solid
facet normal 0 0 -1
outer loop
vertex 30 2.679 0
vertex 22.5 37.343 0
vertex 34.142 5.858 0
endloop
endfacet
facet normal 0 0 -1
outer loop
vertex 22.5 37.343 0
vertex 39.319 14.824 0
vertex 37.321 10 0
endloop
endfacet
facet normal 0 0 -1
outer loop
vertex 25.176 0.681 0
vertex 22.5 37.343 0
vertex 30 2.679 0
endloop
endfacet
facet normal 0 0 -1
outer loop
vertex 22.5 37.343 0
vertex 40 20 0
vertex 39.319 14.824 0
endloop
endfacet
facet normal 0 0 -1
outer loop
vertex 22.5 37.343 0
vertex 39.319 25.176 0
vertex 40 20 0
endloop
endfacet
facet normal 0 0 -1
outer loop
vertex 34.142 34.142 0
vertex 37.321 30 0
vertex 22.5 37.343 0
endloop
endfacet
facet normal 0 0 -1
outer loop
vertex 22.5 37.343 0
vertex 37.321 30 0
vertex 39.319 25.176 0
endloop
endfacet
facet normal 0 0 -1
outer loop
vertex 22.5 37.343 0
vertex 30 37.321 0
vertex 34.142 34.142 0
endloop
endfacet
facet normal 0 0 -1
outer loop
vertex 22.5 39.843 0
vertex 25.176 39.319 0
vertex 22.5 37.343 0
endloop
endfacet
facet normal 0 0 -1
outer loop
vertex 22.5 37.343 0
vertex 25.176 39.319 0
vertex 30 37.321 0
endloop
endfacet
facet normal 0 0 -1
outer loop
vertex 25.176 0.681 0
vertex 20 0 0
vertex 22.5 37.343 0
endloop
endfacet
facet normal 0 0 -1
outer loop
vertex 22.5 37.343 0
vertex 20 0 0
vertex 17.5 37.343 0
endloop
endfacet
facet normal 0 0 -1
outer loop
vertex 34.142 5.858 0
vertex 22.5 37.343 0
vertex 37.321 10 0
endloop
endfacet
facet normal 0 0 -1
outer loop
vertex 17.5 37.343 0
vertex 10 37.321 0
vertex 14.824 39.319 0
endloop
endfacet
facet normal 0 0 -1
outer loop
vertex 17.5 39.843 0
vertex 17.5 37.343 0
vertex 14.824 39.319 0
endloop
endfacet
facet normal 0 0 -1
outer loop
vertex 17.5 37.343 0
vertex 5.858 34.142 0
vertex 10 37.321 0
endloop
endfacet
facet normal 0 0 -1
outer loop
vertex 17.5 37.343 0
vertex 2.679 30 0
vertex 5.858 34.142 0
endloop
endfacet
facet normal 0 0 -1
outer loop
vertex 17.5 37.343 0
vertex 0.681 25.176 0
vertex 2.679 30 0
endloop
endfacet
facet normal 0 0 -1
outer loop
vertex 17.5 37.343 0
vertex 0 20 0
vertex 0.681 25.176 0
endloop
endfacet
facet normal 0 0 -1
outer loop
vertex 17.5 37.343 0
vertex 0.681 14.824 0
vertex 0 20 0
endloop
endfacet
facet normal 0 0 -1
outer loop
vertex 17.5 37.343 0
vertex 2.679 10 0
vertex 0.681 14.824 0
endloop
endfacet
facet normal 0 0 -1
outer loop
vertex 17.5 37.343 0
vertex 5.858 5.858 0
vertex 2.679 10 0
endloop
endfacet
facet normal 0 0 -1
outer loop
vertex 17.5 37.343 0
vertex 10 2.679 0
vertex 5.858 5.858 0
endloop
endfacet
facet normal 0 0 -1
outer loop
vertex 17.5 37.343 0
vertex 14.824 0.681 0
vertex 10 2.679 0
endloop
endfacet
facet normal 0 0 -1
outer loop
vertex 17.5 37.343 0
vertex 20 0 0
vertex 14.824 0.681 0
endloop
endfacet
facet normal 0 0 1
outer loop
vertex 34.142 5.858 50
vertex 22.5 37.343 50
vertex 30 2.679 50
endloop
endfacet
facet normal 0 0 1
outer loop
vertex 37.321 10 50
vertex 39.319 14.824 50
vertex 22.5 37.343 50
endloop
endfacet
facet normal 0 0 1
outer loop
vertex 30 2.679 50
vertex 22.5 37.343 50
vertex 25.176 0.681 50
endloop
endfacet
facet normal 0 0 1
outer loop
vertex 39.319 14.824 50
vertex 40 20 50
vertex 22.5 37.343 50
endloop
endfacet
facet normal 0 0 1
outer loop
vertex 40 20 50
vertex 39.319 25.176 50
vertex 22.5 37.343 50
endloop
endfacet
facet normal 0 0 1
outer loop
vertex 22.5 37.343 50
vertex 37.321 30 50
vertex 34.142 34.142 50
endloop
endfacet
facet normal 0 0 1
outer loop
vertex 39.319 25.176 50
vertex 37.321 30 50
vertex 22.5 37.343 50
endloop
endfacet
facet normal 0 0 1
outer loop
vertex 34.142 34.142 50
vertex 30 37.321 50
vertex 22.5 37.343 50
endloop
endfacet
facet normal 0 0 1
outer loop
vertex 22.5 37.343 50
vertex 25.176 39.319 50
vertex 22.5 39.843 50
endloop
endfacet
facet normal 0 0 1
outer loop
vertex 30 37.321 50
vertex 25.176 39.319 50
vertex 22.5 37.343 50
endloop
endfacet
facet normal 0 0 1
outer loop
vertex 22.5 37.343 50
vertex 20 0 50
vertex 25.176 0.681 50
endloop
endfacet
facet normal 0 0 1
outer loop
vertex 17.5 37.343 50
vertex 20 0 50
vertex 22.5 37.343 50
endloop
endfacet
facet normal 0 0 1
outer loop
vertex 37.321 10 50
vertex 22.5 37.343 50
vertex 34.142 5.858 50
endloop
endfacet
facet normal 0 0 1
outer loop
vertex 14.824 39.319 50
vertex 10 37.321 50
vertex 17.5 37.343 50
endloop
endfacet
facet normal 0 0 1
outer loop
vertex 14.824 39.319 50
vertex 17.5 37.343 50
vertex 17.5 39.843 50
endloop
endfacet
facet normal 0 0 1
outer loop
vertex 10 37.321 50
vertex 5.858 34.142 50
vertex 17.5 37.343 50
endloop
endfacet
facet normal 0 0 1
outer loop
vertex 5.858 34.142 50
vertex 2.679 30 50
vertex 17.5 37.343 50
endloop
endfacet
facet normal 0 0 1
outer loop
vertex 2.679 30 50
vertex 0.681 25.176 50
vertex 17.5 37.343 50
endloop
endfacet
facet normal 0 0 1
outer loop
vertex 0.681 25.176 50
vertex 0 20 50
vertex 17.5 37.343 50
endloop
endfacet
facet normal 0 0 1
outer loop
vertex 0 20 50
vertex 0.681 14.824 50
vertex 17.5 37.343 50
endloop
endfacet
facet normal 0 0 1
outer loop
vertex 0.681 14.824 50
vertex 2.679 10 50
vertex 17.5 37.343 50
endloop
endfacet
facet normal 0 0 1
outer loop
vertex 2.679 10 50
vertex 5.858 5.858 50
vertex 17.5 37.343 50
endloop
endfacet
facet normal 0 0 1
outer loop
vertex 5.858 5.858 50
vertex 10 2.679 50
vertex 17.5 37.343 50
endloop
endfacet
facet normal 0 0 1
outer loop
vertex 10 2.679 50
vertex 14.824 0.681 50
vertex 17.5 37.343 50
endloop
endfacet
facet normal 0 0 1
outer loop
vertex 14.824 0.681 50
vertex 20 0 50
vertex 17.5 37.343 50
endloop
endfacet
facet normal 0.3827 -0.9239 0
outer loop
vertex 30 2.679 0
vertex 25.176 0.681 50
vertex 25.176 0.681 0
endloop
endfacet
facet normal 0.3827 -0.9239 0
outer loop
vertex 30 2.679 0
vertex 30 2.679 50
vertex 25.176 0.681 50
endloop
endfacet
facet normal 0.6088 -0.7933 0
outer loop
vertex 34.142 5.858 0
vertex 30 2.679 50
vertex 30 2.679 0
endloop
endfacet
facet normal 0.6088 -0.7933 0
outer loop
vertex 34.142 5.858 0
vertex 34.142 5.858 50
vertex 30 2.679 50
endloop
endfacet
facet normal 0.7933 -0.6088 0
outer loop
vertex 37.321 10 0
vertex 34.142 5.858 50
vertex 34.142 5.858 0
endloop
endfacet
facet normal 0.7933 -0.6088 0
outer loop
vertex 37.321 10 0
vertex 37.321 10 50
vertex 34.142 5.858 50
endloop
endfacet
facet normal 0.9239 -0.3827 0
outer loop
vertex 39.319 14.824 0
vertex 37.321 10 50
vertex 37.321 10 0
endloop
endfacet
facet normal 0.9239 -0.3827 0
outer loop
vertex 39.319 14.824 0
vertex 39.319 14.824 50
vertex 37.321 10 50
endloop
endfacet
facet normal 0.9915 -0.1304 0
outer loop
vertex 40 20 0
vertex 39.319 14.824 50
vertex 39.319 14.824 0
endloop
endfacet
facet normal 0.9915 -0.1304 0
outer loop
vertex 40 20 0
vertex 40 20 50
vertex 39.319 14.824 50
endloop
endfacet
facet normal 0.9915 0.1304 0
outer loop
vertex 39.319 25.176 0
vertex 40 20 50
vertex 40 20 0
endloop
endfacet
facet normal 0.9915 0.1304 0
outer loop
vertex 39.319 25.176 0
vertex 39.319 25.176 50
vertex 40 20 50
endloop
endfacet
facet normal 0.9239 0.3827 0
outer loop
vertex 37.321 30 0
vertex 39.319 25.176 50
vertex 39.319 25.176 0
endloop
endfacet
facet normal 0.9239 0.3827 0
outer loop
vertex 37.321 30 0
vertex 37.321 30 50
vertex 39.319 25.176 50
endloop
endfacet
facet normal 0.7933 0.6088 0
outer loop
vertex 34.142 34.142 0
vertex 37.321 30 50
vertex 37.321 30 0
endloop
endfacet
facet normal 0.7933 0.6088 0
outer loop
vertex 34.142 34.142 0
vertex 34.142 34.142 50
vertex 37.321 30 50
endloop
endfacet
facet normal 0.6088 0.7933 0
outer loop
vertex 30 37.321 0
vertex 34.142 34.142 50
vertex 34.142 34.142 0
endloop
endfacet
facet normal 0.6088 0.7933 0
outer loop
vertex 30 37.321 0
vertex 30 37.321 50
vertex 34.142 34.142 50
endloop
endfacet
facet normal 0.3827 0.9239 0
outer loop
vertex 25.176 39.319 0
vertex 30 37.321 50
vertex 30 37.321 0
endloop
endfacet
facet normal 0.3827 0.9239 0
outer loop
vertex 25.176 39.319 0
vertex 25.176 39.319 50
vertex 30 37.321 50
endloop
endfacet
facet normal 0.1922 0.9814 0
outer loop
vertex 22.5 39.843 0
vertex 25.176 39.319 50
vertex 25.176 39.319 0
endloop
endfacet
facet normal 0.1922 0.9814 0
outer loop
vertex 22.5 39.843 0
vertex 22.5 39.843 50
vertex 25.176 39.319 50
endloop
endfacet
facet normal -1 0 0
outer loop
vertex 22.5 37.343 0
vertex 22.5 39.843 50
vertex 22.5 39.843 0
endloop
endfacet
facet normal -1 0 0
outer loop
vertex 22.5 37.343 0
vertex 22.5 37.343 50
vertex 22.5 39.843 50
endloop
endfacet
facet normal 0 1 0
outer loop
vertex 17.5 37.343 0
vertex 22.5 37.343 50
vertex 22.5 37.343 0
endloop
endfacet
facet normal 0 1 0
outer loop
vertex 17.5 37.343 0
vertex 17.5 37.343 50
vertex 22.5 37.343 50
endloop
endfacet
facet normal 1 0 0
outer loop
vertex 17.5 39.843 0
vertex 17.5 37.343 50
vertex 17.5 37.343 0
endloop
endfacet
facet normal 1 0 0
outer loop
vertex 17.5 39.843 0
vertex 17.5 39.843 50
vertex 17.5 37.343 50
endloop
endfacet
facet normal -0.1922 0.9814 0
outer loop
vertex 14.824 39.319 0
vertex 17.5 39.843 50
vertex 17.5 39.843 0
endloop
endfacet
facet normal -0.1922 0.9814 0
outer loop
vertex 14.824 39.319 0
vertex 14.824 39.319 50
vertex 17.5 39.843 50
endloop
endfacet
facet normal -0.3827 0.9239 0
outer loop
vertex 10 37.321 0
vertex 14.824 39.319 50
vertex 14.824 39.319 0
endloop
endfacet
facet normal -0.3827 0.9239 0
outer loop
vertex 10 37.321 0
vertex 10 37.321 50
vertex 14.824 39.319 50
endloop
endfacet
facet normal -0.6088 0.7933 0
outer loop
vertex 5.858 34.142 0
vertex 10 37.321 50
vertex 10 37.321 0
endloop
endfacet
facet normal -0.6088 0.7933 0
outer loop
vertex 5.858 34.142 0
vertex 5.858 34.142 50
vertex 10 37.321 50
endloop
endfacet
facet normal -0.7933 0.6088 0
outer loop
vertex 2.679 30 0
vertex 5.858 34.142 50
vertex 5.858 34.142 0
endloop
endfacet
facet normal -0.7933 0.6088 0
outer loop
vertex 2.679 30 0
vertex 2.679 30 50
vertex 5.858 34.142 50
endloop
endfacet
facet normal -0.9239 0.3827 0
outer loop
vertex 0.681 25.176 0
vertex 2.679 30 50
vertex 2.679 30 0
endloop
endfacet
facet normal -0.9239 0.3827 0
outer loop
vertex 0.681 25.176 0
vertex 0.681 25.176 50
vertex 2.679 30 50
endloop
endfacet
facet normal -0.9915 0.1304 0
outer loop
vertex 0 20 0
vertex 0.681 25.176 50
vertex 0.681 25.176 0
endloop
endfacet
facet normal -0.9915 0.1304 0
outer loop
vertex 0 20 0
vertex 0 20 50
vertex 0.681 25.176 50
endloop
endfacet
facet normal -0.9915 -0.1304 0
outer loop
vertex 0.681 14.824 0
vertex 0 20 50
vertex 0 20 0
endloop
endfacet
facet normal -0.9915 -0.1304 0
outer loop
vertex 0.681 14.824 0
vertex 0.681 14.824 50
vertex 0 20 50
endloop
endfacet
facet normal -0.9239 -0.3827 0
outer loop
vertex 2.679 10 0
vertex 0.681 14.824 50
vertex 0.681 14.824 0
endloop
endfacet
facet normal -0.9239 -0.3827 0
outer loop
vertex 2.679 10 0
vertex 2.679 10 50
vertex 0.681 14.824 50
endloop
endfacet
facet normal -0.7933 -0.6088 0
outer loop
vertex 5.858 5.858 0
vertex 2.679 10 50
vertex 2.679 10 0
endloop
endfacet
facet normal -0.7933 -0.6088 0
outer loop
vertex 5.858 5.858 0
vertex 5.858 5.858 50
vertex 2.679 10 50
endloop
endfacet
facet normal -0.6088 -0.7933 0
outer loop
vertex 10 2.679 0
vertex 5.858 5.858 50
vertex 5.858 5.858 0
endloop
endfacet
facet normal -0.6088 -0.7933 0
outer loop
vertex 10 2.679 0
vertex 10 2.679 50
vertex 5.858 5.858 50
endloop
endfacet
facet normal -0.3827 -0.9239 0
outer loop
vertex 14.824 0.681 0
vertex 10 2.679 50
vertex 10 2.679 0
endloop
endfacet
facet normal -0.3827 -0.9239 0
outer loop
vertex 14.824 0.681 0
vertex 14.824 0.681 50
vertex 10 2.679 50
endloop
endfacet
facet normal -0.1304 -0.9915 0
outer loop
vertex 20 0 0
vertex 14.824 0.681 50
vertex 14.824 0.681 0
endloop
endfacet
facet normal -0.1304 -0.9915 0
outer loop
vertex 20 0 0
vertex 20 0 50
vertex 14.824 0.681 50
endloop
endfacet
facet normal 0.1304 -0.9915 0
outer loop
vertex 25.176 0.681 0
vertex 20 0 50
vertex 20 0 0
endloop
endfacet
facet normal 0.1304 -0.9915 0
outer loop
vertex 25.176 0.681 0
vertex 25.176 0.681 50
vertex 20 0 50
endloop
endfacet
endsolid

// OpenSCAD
$fn = 32;

// ----------------------------------------------------------------------
// Keyway shaft: d40 shaft, key 5 x 2.5 mm
// ----------------------------------------------------------------------

// --- parameters (mm) ---
shaft_r = 20;             // shaft radius
key_w = 5;                // keyway width
key_d = 2.5;              // keyway depth below the surface line
plate_t = 50;             // shaft length, Z (extrusion height)

shaft_d = 2 * shaft_r;  // shaft diameter
circle_step = 15;  // polygon sampling step, degrees

profile = [[14.824, 39.319], [10, 37.321], [5.858, 34.142], [2.679, 30], [0.681, 25.176], [0, 20], [0.681, 14.824], [2.679, 10], [5.858, 5.858], [10, 2.679], [14.824, 0.681], [20, 0], [25.176, 0.681], [30, 2.679], [34.142, 5.858], [37.321, 10], [39.319, 14.824], [40, 20], [39.319, 25.176], [37.321, 30], [34.142, 34.142], [30, 37.321], [25.176, 39.319], [22.5, 39.843], [22.5, 37.343], [17.5, 37.343], [17.5, 39.843]];  // primary outline, 27 points, counter clockwise

// --- the one profile operation ---
linear_extrude(height = plate_t) polygon(points = profile);
